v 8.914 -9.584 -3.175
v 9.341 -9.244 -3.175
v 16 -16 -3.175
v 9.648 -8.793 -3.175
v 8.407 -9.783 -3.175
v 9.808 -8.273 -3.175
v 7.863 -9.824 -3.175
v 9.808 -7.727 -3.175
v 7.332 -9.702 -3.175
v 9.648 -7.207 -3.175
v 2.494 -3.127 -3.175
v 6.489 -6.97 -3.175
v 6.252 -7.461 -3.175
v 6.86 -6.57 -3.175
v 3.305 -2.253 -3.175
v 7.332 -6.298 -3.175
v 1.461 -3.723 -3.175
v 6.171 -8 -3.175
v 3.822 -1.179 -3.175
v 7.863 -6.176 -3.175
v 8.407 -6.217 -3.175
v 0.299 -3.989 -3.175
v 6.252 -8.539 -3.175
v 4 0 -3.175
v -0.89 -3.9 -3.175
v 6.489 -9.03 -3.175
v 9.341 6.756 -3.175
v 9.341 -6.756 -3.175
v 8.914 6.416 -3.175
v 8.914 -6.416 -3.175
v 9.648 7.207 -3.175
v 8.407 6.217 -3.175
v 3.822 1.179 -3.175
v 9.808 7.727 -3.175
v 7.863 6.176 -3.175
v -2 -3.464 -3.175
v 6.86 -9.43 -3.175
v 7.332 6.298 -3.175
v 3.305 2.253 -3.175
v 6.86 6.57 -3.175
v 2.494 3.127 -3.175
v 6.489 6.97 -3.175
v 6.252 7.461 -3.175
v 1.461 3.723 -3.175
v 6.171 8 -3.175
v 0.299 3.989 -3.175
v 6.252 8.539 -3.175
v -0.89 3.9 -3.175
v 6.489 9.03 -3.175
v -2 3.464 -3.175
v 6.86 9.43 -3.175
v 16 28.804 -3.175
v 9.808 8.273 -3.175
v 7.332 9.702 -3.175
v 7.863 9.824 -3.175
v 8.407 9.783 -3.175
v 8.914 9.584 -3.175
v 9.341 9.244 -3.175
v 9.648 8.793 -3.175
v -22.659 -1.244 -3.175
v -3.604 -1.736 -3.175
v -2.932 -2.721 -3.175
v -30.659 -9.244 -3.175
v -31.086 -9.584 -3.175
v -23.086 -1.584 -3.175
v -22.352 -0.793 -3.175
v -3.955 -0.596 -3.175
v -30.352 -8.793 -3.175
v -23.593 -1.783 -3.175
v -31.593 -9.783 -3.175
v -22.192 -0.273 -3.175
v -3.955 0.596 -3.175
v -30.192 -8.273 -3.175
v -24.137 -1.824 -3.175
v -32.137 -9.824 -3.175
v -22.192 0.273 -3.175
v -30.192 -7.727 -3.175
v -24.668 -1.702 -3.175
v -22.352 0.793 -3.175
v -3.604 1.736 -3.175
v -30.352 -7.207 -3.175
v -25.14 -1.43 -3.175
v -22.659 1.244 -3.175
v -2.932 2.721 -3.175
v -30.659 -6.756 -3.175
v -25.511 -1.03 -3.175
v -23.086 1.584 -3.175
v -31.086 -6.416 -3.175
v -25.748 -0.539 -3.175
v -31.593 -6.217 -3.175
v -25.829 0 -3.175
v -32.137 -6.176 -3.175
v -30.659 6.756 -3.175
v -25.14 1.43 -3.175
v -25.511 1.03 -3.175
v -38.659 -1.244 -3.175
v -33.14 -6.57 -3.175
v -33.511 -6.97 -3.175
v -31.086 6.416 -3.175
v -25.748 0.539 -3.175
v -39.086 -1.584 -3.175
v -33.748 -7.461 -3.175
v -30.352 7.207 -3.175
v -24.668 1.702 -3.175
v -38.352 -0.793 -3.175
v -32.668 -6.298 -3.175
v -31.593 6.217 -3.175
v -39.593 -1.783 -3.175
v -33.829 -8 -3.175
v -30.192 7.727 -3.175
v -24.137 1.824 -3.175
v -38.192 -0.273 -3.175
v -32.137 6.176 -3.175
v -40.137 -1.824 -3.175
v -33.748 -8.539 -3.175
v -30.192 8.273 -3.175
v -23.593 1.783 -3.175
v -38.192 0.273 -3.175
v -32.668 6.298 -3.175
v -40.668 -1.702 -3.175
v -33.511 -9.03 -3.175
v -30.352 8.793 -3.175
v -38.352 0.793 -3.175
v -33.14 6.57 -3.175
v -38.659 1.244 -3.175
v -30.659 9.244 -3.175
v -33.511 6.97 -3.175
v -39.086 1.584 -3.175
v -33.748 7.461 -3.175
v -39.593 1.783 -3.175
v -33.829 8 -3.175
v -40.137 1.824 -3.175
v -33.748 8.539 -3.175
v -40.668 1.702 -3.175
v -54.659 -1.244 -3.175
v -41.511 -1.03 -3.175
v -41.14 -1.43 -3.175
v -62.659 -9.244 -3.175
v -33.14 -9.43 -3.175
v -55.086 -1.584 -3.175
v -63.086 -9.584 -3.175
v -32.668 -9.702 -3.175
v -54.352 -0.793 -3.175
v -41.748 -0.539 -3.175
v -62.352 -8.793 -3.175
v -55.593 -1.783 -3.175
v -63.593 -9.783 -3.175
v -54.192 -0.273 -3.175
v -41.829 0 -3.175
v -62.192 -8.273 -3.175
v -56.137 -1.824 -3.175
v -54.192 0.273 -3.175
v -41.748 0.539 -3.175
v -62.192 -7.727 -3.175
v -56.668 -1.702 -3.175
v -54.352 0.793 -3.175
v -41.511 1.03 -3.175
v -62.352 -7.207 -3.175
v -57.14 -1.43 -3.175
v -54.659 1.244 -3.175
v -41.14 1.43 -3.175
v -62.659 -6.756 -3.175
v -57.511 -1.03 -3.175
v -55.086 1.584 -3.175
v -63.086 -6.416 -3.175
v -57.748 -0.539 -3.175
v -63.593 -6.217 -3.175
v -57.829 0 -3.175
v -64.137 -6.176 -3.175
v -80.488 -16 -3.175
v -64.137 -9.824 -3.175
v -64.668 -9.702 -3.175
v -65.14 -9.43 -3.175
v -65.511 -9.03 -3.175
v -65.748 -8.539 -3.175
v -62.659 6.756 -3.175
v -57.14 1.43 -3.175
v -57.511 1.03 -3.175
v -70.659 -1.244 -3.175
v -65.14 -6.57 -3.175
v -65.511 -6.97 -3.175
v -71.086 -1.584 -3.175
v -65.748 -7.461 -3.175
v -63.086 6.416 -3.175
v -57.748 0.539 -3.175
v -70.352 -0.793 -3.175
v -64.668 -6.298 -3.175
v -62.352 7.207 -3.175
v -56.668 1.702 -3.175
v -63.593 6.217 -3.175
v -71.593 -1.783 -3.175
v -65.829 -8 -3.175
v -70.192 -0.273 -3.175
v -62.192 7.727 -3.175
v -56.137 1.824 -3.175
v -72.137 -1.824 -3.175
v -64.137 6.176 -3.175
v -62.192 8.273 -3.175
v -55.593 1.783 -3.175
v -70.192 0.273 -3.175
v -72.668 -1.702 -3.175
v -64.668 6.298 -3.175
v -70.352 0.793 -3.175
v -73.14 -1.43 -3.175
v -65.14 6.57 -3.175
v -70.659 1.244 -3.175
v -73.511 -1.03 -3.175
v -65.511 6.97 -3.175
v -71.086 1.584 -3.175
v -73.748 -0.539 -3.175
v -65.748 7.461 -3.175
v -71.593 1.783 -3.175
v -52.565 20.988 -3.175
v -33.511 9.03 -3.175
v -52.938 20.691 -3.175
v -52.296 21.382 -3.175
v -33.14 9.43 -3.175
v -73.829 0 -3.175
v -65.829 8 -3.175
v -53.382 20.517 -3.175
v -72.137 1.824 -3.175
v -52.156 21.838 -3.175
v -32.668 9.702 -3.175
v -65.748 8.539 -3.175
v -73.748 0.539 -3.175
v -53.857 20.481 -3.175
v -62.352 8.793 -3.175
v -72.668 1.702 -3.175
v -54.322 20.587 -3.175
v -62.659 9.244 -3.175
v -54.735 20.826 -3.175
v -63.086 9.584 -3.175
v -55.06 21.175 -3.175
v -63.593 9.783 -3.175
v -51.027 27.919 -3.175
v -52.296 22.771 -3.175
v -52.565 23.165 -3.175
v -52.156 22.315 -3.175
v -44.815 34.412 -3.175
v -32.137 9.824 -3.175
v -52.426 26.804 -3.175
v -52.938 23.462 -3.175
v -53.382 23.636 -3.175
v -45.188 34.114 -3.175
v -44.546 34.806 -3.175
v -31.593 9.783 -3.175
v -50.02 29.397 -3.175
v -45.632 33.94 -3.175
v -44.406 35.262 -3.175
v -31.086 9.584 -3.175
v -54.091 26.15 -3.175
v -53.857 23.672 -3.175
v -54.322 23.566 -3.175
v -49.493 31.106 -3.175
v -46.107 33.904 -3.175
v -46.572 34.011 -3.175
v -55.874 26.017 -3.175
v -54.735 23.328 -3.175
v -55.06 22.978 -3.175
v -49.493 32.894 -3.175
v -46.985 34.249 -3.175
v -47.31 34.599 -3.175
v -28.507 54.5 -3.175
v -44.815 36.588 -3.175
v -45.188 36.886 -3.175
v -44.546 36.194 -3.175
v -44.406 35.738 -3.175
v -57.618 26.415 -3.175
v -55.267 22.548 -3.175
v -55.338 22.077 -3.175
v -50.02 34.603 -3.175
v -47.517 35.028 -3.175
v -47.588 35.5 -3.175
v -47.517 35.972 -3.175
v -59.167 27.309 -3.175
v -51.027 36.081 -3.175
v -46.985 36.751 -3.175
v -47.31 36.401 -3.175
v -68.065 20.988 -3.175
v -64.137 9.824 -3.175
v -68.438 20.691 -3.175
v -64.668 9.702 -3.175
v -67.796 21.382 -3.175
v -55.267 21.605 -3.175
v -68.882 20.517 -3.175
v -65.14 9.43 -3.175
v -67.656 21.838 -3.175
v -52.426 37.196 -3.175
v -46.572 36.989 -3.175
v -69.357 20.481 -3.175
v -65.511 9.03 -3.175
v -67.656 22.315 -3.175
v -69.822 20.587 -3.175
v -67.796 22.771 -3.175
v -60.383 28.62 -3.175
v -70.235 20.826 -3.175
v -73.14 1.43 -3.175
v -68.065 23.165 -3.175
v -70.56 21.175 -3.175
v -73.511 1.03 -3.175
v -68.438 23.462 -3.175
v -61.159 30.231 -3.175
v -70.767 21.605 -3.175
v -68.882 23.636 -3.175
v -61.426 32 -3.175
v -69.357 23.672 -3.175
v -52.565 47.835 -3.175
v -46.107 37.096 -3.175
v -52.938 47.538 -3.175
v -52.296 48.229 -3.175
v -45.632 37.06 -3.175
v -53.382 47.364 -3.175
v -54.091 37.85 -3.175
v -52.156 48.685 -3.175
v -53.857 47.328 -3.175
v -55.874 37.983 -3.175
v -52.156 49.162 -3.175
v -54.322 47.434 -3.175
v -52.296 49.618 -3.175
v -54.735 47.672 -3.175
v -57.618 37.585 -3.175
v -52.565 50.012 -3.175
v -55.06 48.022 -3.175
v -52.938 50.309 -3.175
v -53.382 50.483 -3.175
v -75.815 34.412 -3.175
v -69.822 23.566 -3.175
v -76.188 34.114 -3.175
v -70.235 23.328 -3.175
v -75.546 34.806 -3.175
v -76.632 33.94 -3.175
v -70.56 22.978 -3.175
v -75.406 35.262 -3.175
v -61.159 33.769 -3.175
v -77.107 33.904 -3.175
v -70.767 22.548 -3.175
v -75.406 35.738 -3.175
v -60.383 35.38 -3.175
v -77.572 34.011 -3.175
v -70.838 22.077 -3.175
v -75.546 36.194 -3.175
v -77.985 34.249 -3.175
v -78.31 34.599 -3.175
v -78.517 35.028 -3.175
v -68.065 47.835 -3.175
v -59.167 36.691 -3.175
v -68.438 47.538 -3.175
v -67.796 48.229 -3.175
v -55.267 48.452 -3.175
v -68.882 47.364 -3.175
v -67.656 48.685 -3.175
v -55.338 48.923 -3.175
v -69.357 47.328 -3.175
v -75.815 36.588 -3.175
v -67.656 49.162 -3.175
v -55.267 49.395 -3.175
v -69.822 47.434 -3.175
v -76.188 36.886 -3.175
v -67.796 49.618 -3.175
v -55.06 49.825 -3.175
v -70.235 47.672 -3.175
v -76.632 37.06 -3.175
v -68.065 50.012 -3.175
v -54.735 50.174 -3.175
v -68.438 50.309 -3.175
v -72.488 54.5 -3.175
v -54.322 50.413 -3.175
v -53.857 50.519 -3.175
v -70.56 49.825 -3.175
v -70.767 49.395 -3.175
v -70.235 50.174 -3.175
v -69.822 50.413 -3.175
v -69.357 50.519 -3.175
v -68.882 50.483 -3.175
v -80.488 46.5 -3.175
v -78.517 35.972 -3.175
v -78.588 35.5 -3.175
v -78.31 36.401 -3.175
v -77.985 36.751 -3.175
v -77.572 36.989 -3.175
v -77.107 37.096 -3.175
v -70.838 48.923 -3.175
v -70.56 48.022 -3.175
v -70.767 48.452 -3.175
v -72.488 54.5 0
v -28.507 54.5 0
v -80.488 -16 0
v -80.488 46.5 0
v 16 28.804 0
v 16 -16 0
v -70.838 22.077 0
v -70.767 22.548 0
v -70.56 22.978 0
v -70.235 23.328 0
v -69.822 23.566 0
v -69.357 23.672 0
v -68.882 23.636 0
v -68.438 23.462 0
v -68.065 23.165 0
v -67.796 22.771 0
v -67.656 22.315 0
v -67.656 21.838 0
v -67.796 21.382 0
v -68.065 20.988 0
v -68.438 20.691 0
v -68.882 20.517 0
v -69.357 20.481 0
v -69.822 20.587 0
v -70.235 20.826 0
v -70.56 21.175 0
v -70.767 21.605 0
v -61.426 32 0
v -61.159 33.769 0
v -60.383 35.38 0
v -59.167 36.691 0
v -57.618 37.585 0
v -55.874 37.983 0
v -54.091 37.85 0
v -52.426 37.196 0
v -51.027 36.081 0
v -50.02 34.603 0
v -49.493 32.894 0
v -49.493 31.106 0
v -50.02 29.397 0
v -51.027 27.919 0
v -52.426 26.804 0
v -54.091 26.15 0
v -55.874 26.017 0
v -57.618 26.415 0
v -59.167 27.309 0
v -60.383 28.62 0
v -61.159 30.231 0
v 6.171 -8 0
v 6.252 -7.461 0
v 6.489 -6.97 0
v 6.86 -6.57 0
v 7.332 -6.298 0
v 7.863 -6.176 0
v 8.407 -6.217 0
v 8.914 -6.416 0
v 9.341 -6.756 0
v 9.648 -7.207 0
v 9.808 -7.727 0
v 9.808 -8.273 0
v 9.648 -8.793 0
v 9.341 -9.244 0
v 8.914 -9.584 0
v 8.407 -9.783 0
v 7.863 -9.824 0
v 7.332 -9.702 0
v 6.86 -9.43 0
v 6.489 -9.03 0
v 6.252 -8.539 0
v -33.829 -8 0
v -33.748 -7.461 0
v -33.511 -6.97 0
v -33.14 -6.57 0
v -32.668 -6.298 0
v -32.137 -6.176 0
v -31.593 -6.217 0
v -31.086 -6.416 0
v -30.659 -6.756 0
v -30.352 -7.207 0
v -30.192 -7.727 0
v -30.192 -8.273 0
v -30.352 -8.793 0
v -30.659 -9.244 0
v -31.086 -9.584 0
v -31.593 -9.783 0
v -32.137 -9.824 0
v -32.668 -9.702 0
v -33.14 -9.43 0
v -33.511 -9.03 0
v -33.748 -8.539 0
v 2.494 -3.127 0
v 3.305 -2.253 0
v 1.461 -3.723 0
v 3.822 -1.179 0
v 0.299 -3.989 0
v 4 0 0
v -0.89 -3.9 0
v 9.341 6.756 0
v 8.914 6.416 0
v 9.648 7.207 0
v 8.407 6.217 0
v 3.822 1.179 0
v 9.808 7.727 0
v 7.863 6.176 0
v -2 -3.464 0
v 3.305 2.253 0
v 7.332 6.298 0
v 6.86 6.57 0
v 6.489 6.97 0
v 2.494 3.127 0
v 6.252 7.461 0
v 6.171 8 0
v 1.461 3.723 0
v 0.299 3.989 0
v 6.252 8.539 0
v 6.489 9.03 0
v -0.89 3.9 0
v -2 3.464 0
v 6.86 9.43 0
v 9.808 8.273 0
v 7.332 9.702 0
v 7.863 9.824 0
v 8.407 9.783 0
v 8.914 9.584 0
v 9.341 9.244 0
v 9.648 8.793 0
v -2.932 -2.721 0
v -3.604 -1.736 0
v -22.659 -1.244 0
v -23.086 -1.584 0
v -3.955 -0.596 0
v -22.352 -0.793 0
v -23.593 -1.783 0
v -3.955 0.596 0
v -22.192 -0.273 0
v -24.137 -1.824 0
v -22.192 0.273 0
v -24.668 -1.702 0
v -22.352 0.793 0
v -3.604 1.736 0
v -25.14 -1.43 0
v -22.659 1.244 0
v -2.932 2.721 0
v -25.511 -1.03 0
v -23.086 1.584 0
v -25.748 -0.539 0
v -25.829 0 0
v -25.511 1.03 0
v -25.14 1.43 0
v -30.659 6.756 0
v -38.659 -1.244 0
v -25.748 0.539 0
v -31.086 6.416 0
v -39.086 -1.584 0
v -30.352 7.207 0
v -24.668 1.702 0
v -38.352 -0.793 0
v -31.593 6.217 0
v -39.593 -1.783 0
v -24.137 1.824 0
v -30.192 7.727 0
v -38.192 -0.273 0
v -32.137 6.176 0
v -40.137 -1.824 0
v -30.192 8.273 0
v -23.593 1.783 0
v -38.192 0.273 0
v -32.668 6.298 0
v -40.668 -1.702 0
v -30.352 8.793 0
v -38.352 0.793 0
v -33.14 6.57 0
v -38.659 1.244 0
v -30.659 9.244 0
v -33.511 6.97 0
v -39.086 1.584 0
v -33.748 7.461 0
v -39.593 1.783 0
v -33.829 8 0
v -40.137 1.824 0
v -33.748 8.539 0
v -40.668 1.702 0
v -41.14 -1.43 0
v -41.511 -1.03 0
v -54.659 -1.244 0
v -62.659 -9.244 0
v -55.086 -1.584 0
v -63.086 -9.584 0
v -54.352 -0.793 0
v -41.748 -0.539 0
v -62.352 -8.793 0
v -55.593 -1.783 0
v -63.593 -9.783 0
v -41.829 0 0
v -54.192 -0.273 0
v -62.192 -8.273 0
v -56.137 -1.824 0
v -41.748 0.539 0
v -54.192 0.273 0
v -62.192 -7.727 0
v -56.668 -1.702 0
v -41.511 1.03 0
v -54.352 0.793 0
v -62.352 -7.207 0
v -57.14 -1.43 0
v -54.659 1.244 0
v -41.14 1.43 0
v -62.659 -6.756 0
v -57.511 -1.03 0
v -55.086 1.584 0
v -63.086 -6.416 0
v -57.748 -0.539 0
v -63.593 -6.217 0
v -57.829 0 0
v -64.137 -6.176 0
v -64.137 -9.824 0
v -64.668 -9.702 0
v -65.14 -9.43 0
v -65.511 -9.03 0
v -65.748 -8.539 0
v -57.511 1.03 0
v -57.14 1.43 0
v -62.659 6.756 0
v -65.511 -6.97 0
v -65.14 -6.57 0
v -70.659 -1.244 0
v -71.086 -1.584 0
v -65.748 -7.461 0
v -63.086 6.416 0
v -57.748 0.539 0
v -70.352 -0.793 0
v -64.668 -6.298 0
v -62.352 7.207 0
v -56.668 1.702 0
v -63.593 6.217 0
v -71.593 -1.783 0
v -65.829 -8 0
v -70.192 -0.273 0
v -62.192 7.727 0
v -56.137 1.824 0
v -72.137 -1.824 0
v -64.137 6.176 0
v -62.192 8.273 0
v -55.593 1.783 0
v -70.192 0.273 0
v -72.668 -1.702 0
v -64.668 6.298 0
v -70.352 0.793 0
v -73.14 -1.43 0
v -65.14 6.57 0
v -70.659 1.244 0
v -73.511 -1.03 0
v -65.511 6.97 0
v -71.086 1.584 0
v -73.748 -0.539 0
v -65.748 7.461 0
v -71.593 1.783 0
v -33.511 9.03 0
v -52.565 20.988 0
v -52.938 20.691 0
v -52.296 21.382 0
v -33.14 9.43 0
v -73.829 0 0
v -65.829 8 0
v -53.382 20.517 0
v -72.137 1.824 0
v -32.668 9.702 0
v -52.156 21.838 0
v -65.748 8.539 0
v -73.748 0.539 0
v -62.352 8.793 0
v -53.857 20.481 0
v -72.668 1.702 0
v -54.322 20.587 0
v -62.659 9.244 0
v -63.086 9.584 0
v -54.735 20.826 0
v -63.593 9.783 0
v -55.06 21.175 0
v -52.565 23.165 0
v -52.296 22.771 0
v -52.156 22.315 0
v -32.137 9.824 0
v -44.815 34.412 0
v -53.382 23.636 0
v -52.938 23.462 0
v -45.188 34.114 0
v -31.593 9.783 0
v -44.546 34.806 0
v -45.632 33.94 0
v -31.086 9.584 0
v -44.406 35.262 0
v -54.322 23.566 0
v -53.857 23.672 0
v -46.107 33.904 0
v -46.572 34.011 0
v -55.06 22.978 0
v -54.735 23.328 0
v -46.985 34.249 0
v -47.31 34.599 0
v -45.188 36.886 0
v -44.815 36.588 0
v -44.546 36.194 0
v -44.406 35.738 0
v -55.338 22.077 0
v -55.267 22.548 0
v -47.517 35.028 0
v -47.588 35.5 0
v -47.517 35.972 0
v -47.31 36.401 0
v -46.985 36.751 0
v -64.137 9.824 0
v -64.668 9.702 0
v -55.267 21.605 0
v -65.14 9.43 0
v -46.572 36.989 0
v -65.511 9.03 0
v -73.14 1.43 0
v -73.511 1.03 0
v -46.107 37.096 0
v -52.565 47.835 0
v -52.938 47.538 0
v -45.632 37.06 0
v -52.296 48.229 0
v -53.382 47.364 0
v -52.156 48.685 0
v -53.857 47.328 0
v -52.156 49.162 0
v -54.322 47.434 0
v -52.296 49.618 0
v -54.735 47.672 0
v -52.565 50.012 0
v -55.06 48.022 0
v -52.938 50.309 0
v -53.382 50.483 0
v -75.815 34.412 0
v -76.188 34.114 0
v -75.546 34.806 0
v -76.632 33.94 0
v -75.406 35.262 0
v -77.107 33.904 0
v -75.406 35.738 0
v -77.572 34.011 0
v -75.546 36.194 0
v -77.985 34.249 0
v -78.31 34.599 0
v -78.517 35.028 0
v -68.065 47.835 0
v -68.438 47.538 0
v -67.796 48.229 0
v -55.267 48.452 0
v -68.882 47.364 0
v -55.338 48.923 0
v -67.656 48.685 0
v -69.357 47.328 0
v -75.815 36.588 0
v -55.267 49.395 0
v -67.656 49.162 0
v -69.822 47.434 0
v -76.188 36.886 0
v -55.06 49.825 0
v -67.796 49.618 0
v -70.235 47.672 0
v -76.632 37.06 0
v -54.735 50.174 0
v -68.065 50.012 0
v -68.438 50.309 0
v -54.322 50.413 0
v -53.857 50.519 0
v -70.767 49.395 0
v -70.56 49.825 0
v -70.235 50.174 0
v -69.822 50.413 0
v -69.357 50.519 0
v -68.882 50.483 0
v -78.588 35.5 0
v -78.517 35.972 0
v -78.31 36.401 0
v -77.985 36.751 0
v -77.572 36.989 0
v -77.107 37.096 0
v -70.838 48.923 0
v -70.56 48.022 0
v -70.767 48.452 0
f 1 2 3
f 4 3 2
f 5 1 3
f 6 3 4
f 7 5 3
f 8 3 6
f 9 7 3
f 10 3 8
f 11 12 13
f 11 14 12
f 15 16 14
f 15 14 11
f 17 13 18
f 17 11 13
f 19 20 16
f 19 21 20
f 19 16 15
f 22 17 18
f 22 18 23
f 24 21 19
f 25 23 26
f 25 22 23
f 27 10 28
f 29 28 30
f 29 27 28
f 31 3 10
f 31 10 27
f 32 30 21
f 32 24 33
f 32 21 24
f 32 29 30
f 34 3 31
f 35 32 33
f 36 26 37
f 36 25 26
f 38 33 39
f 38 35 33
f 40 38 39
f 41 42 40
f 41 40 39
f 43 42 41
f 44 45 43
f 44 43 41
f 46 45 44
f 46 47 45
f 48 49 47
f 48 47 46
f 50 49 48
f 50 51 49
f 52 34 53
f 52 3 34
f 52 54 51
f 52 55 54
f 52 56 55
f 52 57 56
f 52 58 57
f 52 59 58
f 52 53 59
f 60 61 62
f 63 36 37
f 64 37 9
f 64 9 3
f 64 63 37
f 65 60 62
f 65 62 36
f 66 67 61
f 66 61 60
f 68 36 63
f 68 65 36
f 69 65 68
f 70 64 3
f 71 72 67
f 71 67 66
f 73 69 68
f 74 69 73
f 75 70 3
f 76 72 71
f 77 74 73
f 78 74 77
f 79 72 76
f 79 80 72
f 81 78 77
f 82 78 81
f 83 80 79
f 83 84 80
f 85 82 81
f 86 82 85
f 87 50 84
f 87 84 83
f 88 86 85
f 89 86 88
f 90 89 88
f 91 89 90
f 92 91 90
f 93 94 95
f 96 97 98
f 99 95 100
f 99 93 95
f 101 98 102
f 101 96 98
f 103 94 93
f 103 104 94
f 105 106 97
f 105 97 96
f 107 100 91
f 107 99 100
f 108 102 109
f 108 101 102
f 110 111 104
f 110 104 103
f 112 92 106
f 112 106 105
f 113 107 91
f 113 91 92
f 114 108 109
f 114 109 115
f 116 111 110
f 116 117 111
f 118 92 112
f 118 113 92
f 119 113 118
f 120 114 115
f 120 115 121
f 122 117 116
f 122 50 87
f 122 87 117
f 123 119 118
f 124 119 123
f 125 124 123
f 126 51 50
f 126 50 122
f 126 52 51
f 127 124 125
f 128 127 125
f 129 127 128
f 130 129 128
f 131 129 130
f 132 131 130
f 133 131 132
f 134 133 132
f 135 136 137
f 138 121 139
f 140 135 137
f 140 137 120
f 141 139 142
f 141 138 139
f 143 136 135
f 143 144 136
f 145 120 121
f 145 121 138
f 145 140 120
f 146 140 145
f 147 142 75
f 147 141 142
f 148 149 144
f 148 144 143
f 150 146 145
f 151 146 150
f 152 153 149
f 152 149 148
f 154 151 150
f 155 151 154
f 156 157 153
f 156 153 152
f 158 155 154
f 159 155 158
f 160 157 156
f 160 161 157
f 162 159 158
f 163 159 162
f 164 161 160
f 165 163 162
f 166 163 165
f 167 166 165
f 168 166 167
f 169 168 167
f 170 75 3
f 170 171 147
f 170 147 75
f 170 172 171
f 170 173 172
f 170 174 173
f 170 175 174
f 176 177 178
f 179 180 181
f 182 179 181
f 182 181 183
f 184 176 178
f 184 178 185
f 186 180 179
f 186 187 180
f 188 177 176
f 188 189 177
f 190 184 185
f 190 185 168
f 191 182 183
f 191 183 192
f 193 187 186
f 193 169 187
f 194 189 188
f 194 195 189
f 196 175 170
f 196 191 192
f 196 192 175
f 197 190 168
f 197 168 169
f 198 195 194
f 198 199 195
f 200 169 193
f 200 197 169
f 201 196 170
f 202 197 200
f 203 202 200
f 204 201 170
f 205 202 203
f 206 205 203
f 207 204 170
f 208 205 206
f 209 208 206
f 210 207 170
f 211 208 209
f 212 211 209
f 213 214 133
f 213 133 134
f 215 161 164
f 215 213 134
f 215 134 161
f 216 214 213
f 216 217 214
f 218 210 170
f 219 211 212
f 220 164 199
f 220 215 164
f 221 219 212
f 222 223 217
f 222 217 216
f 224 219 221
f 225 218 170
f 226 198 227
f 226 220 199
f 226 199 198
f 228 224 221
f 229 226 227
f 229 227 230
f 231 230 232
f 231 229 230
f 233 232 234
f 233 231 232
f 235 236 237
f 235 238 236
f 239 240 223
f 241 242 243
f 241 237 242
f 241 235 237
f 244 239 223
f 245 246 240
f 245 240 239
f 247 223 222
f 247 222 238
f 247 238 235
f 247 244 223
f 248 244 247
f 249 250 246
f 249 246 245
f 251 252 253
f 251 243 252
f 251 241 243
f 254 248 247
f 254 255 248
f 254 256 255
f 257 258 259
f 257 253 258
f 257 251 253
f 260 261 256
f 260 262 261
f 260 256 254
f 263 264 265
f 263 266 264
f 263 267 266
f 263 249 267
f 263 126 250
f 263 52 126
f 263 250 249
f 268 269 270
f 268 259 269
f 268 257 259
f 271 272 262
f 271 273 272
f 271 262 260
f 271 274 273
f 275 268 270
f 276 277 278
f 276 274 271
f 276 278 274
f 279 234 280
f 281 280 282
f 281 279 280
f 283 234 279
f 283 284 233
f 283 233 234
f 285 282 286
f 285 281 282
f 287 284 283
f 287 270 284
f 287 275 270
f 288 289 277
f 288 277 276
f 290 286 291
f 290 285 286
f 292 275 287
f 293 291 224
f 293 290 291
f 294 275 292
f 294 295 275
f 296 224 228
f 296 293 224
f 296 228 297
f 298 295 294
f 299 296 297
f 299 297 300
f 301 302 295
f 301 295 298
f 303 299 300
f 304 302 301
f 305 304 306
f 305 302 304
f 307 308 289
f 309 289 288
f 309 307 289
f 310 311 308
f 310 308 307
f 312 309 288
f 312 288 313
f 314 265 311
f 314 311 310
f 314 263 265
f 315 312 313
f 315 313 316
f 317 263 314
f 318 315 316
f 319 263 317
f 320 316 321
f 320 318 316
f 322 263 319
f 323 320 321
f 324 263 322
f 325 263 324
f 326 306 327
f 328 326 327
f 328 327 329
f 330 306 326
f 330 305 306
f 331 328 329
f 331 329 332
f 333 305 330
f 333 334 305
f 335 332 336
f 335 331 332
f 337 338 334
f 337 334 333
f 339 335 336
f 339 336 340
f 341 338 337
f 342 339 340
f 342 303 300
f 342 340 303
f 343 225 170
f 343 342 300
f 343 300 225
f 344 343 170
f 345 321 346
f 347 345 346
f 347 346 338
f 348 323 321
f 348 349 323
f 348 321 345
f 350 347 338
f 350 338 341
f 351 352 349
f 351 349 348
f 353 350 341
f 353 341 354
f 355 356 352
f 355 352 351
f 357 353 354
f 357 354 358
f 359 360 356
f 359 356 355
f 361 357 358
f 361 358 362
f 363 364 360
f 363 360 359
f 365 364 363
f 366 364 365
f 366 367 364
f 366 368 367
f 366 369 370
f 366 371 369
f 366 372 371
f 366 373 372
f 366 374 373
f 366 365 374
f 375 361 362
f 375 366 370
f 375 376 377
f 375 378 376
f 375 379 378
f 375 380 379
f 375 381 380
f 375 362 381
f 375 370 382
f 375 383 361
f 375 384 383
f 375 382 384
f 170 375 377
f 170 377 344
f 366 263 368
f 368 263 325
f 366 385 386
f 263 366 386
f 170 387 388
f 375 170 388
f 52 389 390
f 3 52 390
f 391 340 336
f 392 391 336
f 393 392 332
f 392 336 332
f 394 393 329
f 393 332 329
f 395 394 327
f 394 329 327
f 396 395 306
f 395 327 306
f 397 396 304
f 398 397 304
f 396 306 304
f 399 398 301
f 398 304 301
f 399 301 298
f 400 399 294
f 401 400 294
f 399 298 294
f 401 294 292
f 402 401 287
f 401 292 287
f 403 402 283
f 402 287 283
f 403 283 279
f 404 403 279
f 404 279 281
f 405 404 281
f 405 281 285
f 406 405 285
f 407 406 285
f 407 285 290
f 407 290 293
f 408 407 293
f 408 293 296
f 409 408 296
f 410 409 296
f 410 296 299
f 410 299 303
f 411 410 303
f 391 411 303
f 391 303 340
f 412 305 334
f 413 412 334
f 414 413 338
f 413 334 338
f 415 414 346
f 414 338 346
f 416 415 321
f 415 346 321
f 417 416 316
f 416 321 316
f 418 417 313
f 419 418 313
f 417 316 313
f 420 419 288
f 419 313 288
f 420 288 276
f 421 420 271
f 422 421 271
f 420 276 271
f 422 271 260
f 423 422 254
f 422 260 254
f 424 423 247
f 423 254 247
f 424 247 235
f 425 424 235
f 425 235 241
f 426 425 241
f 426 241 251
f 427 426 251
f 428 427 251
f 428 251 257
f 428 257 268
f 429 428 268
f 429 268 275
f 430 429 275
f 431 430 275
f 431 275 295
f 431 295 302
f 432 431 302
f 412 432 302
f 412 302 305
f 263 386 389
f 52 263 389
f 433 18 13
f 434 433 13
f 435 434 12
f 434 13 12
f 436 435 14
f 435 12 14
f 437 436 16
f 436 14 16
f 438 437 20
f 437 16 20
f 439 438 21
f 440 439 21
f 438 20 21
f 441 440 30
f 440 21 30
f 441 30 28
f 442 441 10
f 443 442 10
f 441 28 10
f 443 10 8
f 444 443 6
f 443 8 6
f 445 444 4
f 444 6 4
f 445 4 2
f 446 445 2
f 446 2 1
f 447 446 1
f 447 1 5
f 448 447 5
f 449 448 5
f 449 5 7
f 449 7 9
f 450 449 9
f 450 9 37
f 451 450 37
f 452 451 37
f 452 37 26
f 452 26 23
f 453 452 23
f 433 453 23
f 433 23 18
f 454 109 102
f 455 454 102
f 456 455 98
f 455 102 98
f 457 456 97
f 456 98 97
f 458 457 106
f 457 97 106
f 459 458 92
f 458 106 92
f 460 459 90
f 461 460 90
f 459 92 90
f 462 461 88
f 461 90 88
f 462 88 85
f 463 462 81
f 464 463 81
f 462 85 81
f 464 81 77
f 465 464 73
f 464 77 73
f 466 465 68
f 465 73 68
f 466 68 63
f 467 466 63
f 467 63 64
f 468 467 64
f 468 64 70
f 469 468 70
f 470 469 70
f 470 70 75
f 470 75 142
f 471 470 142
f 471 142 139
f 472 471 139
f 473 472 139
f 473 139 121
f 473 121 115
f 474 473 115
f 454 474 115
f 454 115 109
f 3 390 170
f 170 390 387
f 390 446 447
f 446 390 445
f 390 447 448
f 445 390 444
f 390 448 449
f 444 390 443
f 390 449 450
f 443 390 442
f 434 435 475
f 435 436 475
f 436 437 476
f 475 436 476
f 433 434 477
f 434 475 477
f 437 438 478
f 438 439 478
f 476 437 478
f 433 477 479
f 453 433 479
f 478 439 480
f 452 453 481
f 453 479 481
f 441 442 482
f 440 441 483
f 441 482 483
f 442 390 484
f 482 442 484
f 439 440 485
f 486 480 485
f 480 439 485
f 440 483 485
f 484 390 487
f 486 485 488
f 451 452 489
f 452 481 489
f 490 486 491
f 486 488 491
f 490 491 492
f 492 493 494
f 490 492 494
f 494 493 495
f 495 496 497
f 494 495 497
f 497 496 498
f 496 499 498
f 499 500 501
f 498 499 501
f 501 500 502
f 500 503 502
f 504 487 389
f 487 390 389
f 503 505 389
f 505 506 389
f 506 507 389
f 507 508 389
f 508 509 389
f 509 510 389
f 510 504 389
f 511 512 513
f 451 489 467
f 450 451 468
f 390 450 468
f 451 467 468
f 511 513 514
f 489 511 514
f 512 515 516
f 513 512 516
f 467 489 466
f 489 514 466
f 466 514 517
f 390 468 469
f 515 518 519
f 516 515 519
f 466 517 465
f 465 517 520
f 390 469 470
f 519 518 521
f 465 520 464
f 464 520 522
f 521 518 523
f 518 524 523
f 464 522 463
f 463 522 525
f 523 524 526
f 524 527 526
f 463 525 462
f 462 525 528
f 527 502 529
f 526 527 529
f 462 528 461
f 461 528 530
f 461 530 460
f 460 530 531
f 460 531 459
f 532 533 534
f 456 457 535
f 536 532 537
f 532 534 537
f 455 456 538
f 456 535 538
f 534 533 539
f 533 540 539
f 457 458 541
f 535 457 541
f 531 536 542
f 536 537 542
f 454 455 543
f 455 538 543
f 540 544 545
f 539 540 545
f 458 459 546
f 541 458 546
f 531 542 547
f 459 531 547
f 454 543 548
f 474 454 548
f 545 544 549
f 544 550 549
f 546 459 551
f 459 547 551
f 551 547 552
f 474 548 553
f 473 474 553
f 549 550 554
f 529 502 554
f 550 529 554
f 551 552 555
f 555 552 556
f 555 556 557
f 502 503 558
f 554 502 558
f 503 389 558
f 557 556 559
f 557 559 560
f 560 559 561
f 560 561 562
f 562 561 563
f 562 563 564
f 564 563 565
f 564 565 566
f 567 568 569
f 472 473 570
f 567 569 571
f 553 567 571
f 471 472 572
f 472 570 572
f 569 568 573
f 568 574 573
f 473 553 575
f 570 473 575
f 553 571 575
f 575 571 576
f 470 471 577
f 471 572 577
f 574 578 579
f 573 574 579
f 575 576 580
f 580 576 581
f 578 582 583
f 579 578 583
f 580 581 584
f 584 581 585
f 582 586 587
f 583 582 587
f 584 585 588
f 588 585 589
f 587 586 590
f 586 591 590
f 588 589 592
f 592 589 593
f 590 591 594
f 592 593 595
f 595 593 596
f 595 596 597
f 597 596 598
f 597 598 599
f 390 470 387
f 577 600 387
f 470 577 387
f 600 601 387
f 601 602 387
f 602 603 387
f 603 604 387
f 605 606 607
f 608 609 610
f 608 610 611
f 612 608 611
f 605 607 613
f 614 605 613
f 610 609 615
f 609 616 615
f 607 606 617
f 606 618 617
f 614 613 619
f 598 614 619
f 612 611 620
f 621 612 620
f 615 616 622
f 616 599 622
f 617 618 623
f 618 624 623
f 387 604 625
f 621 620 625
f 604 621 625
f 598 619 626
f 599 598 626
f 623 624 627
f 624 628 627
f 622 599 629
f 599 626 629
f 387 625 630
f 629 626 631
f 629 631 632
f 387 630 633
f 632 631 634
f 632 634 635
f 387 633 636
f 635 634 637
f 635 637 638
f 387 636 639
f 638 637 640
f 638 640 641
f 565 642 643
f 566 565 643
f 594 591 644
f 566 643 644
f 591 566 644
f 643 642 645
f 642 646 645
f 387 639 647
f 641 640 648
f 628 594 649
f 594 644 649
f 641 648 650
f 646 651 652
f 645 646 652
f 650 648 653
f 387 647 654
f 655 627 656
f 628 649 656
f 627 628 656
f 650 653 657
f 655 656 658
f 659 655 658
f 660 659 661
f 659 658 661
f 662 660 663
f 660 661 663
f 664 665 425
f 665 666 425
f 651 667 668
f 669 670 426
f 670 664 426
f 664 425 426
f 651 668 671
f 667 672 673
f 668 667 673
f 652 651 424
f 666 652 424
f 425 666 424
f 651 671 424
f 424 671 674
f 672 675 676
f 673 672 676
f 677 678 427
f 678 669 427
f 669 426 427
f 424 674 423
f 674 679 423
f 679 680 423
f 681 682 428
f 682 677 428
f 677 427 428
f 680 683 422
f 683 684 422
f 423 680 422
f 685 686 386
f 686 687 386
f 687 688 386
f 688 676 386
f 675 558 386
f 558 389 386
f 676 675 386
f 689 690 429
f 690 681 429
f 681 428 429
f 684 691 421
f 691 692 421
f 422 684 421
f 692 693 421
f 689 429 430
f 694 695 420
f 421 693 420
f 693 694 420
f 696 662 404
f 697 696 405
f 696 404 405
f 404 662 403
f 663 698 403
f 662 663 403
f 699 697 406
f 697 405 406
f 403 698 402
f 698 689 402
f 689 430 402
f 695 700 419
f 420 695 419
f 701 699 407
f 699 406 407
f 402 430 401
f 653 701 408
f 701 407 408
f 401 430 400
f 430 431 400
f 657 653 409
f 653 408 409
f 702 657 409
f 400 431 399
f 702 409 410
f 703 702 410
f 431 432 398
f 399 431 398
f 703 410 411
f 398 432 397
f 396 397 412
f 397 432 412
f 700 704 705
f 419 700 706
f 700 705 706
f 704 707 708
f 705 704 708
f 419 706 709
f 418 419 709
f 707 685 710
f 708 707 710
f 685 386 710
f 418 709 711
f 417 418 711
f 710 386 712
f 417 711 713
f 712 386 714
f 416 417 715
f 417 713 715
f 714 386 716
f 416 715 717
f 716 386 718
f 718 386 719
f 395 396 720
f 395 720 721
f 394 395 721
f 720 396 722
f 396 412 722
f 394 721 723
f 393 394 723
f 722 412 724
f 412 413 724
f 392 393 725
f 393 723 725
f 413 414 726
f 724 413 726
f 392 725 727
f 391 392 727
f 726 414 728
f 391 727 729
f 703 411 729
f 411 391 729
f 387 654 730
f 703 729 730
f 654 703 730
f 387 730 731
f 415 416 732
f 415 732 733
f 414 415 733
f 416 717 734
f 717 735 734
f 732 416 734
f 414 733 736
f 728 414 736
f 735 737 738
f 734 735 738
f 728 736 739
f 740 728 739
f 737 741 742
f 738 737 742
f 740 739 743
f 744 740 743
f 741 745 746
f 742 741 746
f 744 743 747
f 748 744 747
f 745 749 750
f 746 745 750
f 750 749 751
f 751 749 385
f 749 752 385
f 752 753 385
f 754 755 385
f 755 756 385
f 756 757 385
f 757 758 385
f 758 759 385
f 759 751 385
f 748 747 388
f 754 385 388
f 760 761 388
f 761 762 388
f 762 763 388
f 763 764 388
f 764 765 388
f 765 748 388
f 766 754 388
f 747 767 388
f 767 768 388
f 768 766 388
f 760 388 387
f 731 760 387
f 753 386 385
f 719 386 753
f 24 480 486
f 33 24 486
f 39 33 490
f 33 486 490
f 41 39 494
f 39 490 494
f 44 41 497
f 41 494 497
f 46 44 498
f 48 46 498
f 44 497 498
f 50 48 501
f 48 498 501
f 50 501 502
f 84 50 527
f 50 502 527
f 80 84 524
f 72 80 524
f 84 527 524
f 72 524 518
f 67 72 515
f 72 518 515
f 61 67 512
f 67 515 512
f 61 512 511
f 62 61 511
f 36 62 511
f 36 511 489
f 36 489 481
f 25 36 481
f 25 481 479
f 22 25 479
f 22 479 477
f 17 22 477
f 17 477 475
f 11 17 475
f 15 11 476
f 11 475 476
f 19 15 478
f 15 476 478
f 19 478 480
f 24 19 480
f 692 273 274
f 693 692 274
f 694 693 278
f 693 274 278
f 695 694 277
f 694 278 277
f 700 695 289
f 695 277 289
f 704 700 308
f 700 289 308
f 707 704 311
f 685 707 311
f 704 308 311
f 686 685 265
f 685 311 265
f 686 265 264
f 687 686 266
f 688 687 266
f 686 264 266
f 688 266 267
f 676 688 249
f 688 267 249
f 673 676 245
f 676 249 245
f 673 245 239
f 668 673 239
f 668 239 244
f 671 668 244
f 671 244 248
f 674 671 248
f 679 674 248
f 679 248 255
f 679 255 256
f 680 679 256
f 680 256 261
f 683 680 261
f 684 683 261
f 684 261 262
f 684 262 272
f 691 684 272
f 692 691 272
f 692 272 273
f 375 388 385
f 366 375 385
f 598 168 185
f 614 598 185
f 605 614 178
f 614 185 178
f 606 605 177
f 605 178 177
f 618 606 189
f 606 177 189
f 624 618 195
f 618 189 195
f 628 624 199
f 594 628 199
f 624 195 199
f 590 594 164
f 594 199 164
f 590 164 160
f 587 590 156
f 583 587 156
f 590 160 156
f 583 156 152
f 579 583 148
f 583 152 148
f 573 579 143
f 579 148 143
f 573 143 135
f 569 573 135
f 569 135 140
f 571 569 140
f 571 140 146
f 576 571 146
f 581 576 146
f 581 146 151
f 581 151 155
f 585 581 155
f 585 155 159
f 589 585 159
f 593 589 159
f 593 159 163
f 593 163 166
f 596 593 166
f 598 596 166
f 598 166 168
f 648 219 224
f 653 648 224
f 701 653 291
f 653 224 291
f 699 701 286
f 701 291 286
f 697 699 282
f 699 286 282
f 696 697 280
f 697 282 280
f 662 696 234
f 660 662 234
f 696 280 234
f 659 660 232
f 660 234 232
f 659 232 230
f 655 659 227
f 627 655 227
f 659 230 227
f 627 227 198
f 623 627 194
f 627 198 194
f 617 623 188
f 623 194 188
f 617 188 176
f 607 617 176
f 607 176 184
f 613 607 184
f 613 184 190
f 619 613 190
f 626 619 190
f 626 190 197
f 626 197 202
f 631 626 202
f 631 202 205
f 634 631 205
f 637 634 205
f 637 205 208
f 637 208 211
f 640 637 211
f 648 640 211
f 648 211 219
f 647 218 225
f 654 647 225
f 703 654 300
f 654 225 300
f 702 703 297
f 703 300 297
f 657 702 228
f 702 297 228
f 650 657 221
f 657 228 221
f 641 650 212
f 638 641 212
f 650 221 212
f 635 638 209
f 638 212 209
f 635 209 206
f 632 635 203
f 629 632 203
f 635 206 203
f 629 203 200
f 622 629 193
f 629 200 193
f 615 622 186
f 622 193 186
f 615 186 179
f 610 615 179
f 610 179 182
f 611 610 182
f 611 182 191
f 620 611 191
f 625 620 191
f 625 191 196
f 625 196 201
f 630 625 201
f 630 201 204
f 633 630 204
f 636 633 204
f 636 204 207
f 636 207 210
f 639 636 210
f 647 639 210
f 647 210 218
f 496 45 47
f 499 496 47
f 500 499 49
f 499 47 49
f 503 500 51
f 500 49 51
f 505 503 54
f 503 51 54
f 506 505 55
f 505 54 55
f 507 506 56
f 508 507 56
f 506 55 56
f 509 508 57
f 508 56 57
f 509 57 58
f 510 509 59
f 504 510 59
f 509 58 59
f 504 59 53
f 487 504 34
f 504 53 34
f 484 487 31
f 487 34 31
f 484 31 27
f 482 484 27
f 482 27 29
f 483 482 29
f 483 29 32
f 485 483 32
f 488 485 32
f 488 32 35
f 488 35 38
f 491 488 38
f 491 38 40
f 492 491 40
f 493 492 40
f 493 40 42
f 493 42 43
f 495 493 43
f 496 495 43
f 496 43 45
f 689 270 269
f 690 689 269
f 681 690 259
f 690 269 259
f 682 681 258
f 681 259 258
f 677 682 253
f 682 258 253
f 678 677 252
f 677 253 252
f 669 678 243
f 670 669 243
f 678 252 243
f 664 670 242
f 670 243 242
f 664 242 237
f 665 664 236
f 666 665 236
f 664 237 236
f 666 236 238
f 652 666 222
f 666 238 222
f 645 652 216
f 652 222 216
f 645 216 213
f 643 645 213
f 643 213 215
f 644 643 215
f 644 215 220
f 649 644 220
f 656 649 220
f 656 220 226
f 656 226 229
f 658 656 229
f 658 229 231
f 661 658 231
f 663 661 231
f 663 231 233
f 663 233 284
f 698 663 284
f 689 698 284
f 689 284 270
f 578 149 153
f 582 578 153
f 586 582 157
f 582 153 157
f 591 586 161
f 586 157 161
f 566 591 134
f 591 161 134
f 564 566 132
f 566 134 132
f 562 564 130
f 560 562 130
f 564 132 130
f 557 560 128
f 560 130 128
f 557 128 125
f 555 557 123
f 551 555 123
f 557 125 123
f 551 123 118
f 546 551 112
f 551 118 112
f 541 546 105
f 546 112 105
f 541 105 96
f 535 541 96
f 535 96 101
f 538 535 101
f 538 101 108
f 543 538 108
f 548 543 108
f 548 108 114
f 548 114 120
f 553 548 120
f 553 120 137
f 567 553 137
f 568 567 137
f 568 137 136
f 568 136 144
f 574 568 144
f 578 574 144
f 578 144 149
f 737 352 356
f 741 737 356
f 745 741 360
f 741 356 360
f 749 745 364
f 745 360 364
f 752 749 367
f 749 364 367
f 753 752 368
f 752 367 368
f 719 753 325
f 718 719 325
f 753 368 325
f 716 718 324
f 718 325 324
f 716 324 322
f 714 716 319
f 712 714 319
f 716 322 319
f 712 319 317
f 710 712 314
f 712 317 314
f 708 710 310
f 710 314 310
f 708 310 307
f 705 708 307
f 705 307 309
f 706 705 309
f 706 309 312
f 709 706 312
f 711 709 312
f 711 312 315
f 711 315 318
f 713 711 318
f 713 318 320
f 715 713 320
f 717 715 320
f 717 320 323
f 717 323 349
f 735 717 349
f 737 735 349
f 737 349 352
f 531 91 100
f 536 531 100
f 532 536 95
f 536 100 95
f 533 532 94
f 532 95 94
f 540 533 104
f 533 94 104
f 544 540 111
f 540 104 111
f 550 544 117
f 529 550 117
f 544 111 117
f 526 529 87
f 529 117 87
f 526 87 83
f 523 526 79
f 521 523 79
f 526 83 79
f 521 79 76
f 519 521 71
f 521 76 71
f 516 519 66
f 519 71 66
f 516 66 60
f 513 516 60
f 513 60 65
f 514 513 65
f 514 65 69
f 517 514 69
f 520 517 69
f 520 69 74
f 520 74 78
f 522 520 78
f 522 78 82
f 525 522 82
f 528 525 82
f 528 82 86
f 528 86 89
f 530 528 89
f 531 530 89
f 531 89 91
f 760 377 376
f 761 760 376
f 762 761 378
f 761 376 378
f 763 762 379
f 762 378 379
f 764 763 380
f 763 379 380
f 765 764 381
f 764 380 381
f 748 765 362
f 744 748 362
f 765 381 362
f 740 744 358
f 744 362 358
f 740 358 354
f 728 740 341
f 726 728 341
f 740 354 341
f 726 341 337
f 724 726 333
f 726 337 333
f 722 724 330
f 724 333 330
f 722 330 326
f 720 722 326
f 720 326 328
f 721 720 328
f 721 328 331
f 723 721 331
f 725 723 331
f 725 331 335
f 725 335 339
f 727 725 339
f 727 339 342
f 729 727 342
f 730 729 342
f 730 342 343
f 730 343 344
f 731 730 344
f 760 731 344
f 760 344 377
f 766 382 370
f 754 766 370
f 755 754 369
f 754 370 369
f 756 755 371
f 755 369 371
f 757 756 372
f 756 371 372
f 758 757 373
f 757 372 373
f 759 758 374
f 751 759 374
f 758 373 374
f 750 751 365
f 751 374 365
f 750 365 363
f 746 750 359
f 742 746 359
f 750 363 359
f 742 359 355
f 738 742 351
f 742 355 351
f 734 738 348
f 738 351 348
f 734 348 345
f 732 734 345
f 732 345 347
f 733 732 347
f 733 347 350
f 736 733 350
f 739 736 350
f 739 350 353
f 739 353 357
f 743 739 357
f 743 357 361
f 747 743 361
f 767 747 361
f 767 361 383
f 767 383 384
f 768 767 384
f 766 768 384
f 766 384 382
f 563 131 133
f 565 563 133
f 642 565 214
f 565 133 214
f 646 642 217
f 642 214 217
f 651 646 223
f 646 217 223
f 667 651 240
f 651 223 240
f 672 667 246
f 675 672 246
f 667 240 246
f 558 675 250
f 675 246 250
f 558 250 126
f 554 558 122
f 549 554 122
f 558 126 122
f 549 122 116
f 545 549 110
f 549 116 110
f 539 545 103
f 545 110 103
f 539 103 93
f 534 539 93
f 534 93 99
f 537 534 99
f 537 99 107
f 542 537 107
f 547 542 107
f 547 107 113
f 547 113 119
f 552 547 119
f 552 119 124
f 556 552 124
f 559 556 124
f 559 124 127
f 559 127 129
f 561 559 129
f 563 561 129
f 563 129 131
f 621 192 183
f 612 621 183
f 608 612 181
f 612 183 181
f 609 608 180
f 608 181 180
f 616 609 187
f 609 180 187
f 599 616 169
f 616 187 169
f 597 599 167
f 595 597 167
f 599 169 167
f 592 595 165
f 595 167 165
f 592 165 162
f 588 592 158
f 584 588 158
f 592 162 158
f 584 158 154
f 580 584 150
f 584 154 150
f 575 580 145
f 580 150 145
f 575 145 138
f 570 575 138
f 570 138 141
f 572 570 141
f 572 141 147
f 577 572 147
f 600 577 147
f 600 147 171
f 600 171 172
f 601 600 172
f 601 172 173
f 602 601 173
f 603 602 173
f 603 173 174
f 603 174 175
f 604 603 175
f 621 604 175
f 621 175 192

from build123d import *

# Parameters (mm, degrees)
SKETCH1_R                  = 4
BOSS_EXTRUDE1_DEPTH        = 3.175
M3_CLEARANCE_HOLE1_D       = 3.2
F_12_0_12_DIAMETER_HOLE1_D = 12
F_6_CLEARANCE_HOLE2_D      = 3.6576
F_6_CLEARANCE_HOLE1_D      = 3.6576


with BuildPart() as part:
    # Sketch1 → Boss-Extrude1 (new body)
    with BuildSketch(Plane.XY):
        Polygon((16, -16), (-80.487803669, -16), (-80.487803669, 46.5), (-72.487803669, 54.5), (-28.507138544, 54.5), (16, 28.803791581), align=None)
        Circle(SKETCH1_R, mode=Mode.SUBTRACT)
    extrude(amount=-BOSS_EXTRUDE1_DEPTH)

    # M3 Clearance Hole1 (through all)
    with Locations(Plane.XY):
        with Locations((-69.237803669, 48.923393759), (-53.737803669, 48.923393759), (-45.987803669, 35.5), (-53.737803669, 22.076606241), (-69.237803669, 22.076606241), (-76.987803669, 35.5)):
            Hole(M3_CLEARANCE_HOLE1_D / 2)

    # Ø12.0 (12) Diameter Hole1 (through all)
    with Locations(Plane.XY):
        with Locations((-55.425625842, 32)):
            Hole(F_12_0_12_DIAMETER_HOLE1_D / 2)

    # #6 Clearance Hole2 (through all)
    with Locations(Plane.XY):
        with Locations((-72, 0), (-32, -8), (-64, -8)):
            Hole(F_6_CLEARANCE_HOLE2_D / 2)

    # #6 Clearance Hole1 (through all)
    with Locations(Plane.XY):
        with Locations((-32, 8), (-24, 0), (-64, 8), (-56, 0), (-40, 0), (8, 8), (8, -8)):
            Hole(F_6_CLEARANCE_HOLE1_D / 2)


solid = part.part
